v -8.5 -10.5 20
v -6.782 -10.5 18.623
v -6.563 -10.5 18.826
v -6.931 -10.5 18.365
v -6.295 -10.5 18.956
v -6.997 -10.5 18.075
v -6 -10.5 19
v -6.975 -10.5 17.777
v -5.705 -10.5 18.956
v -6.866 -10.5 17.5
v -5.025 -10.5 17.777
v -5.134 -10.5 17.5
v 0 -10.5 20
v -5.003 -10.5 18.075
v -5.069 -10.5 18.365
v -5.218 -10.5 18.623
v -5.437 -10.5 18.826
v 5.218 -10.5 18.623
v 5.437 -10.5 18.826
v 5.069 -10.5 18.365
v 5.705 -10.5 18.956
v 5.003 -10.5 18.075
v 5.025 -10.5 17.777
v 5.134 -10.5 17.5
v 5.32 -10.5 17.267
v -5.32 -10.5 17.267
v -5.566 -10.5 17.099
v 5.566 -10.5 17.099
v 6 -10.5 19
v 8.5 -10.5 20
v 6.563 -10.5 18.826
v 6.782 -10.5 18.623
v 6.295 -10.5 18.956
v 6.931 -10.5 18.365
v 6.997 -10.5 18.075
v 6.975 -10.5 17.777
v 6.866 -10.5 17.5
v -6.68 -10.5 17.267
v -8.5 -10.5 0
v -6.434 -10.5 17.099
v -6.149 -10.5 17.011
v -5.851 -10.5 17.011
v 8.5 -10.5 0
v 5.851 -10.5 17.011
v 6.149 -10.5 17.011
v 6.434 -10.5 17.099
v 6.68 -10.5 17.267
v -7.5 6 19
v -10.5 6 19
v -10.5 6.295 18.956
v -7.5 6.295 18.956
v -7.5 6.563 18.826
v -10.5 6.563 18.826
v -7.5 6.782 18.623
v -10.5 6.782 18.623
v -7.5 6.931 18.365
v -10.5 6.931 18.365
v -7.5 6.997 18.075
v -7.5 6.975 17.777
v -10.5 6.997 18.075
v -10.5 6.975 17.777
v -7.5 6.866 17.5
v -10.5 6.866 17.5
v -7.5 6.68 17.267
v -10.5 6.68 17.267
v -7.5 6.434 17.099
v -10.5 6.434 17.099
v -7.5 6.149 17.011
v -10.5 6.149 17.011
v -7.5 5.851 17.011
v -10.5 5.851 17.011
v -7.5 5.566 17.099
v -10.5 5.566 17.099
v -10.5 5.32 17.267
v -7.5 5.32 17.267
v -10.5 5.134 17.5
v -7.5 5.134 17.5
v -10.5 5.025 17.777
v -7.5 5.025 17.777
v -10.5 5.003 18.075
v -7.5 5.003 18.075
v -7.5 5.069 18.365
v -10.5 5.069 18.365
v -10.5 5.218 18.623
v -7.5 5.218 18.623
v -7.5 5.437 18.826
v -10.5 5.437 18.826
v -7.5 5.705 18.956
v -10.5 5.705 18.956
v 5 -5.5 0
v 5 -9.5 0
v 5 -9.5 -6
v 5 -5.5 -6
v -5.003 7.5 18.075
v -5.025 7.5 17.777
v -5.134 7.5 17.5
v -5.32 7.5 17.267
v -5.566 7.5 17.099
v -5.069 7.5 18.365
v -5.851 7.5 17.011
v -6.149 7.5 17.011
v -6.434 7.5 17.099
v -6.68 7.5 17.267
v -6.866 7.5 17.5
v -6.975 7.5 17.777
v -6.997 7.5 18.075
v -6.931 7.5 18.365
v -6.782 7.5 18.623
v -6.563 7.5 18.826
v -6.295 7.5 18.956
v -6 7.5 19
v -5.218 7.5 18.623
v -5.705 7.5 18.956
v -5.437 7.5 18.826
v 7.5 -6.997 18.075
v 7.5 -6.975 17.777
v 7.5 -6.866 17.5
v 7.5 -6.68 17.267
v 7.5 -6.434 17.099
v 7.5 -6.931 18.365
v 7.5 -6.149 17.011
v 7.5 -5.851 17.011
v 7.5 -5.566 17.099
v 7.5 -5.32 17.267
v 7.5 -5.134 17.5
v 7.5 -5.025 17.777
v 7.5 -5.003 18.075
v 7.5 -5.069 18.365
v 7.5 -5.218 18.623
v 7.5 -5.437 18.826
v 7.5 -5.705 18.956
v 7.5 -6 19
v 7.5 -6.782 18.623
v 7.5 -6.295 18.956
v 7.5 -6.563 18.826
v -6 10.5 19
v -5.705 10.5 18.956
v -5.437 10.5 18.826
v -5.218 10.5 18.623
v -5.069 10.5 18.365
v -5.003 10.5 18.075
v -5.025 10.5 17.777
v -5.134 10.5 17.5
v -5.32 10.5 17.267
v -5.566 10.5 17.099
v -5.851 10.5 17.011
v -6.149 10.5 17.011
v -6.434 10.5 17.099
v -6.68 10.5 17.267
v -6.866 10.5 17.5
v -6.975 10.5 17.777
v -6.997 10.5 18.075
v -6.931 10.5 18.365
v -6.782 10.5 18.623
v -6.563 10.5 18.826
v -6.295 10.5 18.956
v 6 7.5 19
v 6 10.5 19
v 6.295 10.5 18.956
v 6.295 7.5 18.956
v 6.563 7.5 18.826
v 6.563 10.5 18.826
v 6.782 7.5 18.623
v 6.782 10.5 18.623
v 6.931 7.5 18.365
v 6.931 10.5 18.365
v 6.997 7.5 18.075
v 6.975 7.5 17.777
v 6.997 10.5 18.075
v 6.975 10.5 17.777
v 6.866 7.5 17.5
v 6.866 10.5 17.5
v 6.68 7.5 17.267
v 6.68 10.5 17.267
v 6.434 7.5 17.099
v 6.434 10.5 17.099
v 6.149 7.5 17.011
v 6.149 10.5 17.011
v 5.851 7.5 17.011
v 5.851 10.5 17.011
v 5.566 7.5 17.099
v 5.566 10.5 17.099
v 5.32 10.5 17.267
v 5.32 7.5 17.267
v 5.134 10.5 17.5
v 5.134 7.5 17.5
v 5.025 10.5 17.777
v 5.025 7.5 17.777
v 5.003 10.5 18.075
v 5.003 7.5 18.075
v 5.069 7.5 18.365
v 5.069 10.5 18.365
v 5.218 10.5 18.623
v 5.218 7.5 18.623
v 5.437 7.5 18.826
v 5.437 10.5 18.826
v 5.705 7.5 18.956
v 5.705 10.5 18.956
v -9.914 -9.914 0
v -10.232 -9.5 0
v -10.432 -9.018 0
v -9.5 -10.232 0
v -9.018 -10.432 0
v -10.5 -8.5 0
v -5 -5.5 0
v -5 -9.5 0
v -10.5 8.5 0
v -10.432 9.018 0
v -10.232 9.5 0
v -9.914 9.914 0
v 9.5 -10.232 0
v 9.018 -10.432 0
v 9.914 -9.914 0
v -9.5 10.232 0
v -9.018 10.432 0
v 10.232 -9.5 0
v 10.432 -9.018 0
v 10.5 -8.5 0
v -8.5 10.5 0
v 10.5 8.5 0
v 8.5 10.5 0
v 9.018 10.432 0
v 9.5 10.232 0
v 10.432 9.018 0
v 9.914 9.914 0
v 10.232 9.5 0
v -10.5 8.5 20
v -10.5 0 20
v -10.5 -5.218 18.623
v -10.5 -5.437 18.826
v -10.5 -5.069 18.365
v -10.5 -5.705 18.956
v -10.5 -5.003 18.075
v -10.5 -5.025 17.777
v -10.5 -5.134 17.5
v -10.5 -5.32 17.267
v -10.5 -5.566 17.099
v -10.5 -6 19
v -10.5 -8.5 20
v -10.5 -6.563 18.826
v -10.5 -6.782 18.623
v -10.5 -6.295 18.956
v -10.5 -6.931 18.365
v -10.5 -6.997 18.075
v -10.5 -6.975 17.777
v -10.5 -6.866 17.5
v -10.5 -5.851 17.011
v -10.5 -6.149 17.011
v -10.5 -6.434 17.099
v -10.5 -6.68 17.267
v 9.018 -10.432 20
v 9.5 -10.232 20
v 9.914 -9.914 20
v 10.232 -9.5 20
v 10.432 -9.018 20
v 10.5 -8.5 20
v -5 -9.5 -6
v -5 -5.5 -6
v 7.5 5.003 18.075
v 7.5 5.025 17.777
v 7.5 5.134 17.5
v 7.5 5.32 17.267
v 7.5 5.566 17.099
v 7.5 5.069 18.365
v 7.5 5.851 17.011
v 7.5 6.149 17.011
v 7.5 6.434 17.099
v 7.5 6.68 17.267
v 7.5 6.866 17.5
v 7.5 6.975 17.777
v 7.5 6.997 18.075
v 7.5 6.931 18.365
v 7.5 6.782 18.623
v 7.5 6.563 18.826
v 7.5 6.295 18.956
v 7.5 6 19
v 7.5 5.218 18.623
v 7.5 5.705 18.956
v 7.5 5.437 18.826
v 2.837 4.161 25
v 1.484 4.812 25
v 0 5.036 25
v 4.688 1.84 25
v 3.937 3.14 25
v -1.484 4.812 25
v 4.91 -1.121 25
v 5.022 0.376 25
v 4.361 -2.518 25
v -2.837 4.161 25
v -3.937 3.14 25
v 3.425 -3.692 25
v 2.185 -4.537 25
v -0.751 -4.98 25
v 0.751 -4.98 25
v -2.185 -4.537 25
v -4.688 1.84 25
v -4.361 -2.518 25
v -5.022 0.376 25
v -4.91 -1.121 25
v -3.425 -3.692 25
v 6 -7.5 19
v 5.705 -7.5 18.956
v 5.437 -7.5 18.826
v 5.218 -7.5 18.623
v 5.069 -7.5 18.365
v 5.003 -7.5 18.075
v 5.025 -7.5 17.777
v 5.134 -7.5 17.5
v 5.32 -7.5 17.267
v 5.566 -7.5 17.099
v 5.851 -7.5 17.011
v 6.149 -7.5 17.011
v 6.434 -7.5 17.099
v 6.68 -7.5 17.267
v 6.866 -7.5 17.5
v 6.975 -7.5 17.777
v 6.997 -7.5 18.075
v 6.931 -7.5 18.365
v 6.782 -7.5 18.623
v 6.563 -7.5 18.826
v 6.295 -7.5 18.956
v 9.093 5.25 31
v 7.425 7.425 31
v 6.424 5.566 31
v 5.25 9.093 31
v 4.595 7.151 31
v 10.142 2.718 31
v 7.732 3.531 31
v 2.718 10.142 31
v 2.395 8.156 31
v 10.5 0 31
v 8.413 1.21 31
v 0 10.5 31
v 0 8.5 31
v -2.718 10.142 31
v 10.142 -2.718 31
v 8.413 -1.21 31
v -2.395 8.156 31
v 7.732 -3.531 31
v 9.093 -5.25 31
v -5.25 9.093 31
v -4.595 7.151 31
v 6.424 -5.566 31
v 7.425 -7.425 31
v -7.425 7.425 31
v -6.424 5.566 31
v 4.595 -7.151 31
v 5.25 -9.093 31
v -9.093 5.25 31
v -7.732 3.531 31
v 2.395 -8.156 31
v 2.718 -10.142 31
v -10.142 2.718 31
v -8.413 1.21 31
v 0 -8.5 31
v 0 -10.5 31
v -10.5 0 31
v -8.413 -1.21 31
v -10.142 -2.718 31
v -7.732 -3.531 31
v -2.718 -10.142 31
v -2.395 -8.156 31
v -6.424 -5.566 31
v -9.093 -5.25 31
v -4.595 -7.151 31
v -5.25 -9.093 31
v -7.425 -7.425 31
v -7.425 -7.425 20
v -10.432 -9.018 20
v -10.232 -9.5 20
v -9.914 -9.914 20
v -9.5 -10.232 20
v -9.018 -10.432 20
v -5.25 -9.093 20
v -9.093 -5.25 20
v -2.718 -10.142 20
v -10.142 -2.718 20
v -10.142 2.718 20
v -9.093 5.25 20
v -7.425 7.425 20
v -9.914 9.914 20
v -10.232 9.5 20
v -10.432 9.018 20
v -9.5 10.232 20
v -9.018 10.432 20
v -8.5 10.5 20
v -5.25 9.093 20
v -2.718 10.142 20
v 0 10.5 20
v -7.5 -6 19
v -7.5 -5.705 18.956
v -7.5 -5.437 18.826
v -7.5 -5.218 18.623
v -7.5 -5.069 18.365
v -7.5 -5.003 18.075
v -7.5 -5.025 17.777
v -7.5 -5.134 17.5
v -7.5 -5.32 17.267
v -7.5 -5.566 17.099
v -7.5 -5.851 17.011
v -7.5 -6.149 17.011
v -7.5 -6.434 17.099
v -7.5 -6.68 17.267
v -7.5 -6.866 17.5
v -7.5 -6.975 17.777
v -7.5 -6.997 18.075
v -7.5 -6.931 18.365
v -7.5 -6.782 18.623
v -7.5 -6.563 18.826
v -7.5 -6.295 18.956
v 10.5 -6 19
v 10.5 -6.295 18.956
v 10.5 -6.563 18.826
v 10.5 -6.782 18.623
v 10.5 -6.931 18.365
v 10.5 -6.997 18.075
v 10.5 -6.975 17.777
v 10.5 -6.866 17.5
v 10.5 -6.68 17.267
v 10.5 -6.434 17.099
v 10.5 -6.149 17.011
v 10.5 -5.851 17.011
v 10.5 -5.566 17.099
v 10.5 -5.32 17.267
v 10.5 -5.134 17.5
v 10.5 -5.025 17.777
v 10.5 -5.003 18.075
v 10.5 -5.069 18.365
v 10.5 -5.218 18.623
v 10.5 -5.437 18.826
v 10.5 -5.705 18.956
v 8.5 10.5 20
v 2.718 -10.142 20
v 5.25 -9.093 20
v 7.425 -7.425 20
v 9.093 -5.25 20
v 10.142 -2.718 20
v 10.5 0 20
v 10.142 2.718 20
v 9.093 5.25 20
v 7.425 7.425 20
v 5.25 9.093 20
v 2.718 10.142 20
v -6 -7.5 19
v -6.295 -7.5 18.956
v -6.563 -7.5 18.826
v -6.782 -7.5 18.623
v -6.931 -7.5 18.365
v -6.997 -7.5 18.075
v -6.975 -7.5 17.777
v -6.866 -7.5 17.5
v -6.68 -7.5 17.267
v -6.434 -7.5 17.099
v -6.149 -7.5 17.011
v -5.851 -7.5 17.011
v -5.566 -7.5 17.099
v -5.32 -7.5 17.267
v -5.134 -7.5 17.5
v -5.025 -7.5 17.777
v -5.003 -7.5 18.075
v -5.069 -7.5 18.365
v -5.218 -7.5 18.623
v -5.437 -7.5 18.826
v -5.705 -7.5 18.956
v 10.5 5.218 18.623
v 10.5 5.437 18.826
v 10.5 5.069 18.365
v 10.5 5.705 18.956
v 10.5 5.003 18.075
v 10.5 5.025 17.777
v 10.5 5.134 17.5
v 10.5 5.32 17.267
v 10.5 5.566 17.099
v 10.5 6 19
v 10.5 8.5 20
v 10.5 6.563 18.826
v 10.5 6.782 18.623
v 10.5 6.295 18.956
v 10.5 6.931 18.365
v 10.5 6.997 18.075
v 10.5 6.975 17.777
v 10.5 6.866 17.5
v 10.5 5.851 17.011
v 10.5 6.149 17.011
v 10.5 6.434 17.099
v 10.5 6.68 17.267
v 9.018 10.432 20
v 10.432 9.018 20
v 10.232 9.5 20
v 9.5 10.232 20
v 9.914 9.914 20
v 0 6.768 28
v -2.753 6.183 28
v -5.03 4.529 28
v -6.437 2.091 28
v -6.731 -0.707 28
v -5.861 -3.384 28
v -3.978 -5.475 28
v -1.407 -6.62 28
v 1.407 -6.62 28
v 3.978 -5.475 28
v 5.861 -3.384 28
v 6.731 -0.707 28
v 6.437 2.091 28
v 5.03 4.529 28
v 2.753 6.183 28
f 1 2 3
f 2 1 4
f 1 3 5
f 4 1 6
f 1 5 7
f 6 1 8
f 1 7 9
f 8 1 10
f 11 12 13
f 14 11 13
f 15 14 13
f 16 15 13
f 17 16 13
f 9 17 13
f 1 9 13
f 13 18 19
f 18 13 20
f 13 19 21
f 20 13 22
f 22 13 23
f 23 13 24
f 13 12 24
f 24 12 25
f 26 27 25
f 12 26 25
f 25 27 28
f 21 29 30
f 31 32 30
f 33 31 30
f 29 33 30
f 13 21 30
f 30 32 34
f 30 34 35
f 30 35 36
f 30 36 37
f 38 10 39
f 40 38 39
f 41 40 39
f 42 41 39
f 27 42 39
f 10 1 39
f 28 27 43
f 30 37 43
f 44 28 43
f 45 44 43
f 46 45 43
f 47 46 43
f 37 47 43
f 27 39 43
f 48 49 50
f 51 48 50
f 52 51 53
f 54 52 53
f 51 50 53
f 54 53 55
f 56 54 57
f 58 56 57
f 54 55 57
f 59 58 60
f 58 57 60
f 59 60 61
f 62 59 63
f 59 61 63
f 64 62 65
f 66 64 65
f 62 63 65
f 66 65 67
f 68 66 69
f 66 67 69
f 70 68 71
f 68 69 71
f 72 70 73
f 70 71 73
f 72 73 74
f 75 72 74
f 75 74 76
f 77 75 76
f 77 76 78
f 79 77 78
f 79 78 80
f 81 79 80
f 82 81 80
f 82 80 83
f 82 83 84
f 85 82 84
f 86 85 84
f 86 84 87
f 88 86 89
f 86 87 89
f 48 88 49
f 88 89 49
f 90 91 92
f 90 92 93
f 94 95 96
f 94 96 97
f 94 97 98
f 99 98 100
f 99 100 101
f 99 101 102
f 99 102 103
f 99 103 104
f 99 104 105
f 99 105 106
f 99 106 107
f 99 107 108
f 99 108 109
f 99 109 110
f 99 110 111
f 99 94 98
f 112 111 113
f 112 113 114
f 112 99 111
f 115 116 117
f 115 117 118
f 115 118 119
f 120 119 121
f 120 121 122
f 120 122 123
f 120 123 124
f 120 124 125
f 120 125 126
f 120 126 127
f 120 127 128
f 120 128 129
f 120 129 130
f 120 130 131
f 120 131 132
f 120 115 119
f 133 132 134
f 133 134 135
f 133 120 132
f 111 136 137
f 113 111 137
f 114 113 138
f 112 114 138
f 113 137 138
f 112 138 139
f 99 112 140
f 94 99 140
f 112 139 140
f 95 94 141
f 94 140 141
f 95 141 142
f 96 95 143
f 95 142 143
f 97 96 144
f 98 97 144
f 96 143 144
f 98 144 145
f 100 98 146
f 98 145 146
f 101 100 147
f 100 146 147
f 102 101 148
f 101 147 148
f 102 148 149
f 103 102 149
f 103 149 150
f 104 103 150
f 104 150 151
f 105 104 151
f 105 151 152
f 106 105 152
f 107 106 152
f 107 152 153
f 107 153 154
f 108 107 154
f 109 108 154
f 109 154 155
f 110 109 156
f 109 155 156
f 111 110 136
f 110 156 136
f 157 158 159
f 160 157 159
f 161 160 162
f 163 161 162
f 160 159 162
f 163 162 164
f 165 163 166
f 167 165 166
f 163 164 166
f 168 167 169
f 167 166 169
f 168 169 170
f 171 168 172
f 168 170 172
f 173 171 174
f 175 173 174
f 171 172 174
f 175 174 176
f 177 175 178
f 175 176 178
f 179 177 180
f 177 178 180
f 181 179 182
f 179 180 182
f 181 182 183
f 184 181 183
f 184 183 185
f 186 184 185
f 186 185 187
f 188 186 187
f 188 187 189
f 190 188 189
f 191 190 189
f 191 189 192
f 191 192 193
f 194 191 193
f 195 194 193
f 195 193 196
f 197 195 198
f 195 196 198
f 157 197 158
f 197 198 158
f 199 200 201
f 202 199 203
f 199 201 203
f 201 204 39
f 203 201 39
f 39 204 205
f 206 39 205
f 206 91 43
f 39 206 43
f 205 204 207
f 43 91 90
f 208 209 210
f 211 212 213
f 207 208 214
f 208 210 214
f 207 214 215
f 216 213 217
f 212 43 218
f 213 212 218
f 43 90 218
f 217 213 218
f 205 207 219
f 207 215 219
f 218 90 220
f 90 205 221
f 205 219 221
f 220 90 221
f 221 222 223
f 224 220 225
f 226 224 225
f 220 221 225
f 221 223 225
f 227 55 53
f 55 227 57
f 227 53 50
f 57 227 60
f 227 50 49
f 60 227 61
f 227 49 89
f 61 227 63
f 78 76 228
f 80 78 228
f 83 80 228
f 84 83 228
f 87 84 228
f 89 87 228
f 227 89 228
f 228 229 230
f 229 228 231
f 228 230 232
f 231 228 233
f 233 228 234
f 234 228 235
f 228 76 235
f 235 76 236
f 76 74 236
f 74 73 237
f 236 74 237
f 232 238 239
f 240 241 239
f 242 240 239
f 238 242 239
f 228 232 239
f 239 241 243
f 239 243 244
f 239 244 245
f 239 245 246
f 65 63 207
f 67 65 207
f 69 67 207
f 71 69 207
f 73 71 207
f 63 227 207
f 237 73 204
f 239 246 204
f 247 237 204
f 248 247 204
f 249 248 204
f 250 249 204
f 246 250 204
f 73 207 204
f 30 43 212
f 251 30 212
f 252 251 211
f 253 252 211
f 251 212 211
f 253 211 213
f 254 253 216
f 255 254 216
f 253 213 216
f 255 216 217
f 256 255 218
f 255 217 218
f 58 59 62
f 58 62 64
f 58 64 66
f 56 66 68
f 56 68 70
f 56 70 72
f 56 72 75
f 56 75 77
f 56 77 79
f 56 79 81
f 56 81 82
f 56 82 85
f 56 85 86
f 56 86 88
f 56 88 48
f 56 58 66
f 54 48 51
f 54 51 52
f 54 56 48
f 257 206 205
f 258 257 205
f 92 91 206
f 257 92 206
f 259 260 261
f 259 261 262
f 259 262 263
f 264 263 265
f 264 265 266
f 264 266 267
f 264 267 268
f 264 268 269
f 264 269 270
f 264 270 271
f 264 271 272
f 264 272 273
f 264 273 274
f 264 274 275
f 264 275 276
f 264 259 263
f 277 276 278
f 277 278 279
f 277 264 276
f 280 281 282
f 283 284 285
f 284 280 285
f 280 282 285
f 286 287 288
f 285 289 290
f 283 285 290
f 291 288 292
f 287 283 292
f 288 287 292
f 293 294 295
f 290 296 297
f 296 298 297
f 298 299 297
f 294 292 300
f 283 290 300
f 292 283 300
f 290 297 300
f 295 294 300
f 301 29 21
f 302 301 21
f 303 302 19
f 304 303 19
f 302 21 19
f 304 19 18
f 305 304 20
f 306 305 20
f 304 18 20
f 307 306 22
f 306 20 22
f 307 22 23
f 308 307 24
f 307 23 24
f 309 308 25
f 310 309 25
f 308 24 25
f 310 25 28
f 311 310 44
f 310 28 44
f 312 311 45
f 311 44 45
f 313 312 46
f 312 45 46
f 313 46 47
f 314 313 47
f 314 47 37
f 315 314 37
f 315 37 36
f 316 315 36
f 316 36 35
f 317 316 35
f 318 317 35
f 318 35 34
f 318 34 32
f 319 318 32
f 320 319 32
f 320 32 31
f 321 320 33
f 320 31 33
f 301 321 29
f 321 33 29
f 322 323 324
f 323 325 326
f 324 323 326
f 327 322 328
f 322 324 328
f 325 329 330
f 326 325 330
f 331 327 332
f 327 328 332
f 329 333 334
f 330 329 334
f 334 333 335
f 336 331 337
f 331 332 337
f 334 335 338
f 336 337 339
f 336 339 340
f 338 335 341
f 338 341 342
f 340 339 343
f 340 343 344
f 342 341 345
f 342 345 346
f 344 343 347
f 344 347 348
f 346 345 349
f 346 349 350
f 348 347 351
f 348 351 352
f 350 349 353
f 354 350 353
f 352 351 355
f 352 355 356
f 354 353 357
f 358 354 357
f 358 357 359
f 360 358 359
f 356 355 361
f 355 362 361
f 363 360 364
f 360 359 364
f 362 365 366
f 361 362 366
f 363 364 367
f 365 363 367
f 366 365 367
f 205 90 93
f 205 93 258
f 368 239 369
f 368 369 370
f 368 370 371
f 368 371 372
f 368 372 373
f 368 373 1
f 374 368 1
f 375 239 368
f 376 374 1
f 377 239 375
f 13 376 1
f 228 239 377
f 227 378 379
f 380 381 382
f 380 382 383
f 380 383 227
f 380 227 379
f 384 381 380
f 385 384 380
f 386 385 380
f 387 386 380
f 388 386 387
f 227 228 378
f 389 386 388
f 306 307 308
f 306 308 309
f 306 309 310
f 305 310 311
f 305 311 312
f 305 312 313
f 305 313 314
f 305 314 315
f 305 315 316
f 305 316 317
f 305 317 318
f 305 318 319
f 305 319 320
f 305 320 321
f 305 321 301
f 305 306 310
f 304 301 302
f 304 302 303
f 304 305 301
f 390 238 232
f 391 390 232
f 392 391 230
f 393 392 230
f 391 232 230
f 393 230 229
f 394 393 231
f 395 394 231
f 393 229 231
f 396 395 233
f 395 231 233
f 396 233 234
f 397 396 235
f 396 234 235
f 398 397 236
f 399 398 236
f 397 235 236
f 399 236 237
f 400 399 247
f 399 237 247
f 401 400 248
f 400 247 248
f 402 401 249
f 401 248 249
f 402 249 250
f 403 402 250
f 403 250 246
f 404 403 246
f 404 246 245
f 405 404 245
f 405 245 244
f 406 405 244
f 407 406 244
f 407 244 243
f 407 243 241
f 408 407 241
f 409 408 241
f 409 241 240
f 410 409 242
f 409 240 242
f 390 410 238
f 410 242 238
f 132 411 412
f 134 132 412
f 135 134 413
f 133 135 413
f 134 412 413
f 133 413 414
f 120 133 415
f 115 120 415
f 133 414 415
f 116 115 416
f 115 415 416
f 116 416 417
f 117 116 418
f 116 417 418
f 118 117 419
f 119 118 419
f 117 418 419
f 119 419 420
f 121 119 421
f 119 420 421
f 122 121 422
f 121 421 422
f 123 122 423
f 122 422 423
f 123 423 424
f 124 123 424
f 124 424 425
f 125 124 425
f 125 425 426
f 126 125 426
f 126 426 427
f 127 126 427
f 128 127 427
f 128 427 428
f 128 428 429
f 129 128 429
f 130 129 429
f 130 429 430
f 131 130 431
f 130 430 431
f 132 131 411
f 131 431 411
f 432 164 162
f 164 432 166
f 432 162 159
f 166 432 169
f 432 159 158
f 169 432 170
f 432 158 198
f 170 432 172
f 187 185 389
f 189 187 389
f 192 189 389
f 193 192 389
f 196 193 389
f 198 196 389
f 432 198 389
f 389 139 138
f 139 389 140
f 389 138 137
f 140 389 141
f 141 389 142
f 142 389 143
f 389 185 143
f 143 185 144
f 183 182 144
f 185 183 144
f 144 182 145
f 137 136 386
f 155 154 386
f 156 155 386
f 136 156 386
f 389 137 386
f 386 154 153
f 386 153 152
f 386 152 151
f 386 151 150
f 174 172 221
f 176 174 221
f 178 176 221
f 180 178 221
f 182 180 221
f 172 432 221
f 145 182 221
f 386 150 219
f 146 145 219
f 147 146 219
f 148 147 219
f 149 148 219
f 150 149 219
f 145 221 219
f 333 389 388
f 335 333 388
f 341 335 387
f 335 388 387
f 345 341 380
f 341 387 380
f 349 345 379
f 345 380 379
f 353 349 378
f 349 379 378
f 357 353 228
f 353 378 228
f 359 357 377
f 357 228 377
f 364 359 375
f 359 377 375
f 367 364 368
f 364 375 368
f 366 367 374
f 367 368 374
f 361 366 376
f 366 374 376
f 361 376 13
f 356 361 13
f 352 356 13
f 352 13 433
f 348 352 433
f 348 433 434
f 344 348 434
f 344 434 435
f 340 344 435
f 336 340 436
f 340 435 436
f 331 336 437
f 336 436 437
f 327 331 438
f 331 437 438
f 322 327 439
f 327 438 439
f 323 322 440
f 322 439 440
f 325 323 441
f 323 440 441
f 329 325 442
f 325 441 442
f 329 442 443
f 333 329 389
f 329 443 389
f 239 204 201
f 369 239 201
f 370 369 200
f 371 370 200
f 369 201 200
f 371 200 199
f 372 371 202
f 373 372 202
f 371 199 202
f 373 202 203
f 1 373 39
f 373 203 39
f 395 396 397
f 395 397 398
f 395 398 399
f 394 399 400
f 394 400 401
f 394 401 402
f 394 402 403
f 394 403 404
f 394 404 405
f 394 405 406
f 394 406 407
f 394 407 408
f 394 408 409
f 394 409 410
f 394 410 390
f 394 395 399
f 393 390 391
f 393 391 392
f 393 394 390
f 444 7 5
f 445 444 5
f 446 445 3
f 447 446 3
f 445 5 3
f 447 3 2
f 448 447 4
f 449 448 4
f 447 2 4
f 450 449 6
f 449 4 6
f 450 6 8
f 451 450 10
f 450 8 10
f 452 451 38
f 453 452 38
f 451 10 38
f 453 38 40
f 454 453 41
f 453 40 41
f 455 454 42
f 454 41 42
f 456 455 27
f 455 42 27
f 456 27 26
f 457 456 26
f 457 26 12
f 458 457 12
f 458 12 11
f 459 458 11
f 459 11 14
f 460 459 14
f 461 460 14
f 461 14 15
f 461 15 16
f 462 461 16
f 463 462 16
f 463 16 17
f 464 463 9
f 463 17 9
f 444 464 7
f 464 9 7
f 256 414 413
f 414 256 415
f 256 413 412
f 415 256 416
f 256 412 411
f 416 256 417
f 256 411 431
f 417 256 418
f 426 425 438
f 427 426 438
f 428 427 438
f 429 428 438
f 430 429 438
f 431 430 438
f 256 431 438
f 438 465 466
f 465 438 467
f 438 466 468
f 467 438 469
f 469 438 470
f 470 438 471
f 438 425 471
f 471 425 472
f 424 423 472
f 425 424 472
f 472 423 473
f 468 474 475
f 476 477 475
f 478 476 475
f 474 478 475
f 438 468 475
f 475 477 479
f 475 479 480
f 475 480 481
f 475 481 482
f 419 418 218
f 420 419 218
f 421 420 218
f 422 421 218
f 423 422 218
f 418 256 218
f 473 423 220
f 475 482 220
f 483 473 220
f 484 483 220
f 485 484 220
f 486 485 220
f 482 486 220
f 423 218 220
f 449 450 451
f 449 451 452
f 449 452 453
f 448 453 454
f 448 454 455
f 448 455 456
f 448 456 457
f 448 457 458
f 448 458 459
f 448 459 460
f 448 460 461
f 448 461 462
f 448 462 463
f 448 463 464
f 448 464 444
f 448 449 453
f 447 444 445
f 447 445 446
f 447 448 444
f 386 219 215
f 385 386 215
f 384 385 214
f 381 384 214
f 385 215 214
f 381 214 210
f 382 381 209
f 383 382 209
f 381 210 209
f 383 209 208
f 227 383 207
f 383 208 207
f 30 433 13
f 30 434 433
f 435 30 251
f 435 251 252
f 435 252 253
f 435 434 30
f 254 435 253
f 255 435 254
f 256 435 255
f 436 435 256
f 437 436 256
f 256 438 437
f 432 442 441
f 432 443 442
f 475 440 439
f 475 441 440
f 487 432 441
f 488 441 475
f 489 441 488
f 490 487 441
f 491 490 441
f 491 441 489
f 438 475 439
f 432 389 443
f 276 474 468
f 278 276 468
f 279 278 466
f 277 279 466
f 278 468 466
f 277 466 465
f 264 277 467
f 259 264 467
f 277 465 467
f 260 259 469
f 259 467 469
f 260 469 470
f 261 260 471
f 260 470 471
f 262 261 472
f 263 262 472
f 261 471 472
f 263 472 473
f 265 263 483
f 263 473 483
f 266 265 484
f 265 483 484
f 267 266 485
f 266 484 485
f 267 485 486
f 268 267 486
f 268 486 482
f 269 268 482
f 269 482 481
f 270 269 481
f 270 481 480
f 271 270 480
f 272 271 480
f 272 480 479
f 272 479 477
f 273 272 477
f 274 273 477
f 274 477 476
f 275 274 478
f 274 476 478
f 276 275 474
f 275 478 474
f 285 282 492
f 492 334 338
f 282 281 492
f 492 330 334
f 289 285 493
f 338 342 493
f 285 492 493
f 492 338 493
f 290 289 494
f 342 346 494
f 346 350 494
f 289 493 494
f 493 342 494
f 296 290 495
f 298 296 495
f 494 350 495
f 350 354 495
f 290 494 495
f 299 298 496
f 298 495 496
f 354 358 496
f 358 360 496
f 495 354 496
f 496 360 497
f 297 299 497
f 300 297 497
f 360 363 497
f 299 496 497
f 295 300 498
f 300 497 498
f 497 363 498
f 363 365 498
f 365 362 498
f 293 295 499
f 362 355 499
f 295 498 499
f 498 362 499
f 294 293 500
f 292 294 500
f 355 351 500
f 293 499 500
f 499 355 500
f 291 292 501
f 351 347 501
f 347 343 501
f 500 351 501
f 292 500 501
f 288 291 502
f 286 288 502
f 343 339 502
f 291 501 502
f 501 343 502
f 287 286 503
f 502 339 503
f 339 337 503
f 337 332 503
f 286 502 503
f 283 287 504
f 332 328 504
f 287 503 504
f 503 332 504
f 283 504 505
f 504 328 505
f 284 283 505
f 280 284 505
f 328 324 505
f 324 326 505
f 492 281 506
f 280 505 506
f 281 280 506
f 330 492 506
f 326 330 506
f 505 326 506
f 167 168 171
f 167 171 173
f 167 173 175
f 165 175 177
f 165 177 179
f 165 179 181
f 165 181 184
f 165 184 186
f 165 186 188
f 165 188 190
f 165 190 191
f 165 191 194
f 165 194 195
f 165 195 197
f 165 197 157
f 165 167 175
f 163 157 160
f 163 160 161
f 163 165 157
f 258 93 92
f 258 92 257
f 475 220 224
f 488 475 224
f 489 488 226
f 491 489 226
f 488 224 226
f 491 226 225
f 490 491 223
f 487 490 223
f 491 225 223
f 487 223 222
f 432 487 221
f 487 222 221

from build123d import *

# Parameters (mm, degrees)
BOSS_EXTRUDE1_DEPTH = 20
SKETCH4_W           = 10
SKETCH4_H           = 4
BOSS_EXTRUDE2_DEPTH = 6
SKETCH5_R           = 1
CUT_EXTRUDE1_DEPTH  = 3
CIRPATTERN1_COUNT   = 4


with BuildPart() as part:
    # Sketch1 → Boss-Extrude1 (new body)
    with BuildSketch(Plane.XY):
        with BuildLine():
            Line((-8.5, -10.5), (8.5, -10.5))
            ThreePointArc((8.5, -10.5), (9.914213562, -9.914213562), (10.5, -8.5))
            Line((10.5, -8.5), (10.5, 8.5))
            ThreePointArc((10.5, 8.5), (9.914213562, 9.914213562), (8.5, 10.5))
            Line((8.5, 10.5), (-8.5, 10.5))
            ThreePointArc((-8.5, 10.5), (-9.914213562, 9.914213562), (-10.5, 8.5))
            Line((-10.5, 8.5), (-10.5, -8.5))
            ThreePointArc((-10.5, -8.5), (-9.914213562, -9.914213562), (-8.5, -10.5))
        make_face()
    extrude(amount=BOSS_EXTRUDE1_DEPTH)

    # Sketch3 → Revolve1 (revolve)
    with BuildSketch(Plane(origin=(0, 0, 0), x_dir=(0, 0, -1), z_dir=(1, 0, 0))):
        Polygon((-20, 10.5), (-20, 0), (-25, 0), (-25, 5.035898385), (-31, 8.5), (-31, 10.5), align=None)
    revolve(axis=Axis((0, 0, 20), (0, 0, 1)))

    # Sketch4 → Boss-Extrude2 (add)
    with BuildSketch(Plane(origin=(0, 0, 0), x_dir=(-1, 0, 0), z_dir=(0, 0, -1))):
        with Locations((0, -7.5)):
            Rectangle(SKETCH4_W, SKETCH4_H)
    extrude(amount=BOSS_EXTRUDE2_DEPTH)

    # Sketch5 → Cut-Extrude1 (cut)
    with BuildSketch(Plane.ZY.offset(10.5)):
        with Locations((18, 6)):
            Circle(SKETCH5_R)
        with Locations((18, -6)):
            Circle(SKETCH5_R)
    cut_extrude1 = extrude(amount=-CUT_EXTRUDE1_DEPTH, mode=Mode.SUBTRACT)

    # CirPattern1: Cut-Extrude1 ×4 about axis
    cirpattern1_axis = Axis((0, 0, 0), (0, 0, 1))
    for i in range(1, CIRPATTERN1_COUNT):
        add(cut_extrude1.rotate(cirpattern1_axis, i * 360 / CIRPATTERN1_COUNT), mode=Mode.SUBTRACT)


solid = part.part
